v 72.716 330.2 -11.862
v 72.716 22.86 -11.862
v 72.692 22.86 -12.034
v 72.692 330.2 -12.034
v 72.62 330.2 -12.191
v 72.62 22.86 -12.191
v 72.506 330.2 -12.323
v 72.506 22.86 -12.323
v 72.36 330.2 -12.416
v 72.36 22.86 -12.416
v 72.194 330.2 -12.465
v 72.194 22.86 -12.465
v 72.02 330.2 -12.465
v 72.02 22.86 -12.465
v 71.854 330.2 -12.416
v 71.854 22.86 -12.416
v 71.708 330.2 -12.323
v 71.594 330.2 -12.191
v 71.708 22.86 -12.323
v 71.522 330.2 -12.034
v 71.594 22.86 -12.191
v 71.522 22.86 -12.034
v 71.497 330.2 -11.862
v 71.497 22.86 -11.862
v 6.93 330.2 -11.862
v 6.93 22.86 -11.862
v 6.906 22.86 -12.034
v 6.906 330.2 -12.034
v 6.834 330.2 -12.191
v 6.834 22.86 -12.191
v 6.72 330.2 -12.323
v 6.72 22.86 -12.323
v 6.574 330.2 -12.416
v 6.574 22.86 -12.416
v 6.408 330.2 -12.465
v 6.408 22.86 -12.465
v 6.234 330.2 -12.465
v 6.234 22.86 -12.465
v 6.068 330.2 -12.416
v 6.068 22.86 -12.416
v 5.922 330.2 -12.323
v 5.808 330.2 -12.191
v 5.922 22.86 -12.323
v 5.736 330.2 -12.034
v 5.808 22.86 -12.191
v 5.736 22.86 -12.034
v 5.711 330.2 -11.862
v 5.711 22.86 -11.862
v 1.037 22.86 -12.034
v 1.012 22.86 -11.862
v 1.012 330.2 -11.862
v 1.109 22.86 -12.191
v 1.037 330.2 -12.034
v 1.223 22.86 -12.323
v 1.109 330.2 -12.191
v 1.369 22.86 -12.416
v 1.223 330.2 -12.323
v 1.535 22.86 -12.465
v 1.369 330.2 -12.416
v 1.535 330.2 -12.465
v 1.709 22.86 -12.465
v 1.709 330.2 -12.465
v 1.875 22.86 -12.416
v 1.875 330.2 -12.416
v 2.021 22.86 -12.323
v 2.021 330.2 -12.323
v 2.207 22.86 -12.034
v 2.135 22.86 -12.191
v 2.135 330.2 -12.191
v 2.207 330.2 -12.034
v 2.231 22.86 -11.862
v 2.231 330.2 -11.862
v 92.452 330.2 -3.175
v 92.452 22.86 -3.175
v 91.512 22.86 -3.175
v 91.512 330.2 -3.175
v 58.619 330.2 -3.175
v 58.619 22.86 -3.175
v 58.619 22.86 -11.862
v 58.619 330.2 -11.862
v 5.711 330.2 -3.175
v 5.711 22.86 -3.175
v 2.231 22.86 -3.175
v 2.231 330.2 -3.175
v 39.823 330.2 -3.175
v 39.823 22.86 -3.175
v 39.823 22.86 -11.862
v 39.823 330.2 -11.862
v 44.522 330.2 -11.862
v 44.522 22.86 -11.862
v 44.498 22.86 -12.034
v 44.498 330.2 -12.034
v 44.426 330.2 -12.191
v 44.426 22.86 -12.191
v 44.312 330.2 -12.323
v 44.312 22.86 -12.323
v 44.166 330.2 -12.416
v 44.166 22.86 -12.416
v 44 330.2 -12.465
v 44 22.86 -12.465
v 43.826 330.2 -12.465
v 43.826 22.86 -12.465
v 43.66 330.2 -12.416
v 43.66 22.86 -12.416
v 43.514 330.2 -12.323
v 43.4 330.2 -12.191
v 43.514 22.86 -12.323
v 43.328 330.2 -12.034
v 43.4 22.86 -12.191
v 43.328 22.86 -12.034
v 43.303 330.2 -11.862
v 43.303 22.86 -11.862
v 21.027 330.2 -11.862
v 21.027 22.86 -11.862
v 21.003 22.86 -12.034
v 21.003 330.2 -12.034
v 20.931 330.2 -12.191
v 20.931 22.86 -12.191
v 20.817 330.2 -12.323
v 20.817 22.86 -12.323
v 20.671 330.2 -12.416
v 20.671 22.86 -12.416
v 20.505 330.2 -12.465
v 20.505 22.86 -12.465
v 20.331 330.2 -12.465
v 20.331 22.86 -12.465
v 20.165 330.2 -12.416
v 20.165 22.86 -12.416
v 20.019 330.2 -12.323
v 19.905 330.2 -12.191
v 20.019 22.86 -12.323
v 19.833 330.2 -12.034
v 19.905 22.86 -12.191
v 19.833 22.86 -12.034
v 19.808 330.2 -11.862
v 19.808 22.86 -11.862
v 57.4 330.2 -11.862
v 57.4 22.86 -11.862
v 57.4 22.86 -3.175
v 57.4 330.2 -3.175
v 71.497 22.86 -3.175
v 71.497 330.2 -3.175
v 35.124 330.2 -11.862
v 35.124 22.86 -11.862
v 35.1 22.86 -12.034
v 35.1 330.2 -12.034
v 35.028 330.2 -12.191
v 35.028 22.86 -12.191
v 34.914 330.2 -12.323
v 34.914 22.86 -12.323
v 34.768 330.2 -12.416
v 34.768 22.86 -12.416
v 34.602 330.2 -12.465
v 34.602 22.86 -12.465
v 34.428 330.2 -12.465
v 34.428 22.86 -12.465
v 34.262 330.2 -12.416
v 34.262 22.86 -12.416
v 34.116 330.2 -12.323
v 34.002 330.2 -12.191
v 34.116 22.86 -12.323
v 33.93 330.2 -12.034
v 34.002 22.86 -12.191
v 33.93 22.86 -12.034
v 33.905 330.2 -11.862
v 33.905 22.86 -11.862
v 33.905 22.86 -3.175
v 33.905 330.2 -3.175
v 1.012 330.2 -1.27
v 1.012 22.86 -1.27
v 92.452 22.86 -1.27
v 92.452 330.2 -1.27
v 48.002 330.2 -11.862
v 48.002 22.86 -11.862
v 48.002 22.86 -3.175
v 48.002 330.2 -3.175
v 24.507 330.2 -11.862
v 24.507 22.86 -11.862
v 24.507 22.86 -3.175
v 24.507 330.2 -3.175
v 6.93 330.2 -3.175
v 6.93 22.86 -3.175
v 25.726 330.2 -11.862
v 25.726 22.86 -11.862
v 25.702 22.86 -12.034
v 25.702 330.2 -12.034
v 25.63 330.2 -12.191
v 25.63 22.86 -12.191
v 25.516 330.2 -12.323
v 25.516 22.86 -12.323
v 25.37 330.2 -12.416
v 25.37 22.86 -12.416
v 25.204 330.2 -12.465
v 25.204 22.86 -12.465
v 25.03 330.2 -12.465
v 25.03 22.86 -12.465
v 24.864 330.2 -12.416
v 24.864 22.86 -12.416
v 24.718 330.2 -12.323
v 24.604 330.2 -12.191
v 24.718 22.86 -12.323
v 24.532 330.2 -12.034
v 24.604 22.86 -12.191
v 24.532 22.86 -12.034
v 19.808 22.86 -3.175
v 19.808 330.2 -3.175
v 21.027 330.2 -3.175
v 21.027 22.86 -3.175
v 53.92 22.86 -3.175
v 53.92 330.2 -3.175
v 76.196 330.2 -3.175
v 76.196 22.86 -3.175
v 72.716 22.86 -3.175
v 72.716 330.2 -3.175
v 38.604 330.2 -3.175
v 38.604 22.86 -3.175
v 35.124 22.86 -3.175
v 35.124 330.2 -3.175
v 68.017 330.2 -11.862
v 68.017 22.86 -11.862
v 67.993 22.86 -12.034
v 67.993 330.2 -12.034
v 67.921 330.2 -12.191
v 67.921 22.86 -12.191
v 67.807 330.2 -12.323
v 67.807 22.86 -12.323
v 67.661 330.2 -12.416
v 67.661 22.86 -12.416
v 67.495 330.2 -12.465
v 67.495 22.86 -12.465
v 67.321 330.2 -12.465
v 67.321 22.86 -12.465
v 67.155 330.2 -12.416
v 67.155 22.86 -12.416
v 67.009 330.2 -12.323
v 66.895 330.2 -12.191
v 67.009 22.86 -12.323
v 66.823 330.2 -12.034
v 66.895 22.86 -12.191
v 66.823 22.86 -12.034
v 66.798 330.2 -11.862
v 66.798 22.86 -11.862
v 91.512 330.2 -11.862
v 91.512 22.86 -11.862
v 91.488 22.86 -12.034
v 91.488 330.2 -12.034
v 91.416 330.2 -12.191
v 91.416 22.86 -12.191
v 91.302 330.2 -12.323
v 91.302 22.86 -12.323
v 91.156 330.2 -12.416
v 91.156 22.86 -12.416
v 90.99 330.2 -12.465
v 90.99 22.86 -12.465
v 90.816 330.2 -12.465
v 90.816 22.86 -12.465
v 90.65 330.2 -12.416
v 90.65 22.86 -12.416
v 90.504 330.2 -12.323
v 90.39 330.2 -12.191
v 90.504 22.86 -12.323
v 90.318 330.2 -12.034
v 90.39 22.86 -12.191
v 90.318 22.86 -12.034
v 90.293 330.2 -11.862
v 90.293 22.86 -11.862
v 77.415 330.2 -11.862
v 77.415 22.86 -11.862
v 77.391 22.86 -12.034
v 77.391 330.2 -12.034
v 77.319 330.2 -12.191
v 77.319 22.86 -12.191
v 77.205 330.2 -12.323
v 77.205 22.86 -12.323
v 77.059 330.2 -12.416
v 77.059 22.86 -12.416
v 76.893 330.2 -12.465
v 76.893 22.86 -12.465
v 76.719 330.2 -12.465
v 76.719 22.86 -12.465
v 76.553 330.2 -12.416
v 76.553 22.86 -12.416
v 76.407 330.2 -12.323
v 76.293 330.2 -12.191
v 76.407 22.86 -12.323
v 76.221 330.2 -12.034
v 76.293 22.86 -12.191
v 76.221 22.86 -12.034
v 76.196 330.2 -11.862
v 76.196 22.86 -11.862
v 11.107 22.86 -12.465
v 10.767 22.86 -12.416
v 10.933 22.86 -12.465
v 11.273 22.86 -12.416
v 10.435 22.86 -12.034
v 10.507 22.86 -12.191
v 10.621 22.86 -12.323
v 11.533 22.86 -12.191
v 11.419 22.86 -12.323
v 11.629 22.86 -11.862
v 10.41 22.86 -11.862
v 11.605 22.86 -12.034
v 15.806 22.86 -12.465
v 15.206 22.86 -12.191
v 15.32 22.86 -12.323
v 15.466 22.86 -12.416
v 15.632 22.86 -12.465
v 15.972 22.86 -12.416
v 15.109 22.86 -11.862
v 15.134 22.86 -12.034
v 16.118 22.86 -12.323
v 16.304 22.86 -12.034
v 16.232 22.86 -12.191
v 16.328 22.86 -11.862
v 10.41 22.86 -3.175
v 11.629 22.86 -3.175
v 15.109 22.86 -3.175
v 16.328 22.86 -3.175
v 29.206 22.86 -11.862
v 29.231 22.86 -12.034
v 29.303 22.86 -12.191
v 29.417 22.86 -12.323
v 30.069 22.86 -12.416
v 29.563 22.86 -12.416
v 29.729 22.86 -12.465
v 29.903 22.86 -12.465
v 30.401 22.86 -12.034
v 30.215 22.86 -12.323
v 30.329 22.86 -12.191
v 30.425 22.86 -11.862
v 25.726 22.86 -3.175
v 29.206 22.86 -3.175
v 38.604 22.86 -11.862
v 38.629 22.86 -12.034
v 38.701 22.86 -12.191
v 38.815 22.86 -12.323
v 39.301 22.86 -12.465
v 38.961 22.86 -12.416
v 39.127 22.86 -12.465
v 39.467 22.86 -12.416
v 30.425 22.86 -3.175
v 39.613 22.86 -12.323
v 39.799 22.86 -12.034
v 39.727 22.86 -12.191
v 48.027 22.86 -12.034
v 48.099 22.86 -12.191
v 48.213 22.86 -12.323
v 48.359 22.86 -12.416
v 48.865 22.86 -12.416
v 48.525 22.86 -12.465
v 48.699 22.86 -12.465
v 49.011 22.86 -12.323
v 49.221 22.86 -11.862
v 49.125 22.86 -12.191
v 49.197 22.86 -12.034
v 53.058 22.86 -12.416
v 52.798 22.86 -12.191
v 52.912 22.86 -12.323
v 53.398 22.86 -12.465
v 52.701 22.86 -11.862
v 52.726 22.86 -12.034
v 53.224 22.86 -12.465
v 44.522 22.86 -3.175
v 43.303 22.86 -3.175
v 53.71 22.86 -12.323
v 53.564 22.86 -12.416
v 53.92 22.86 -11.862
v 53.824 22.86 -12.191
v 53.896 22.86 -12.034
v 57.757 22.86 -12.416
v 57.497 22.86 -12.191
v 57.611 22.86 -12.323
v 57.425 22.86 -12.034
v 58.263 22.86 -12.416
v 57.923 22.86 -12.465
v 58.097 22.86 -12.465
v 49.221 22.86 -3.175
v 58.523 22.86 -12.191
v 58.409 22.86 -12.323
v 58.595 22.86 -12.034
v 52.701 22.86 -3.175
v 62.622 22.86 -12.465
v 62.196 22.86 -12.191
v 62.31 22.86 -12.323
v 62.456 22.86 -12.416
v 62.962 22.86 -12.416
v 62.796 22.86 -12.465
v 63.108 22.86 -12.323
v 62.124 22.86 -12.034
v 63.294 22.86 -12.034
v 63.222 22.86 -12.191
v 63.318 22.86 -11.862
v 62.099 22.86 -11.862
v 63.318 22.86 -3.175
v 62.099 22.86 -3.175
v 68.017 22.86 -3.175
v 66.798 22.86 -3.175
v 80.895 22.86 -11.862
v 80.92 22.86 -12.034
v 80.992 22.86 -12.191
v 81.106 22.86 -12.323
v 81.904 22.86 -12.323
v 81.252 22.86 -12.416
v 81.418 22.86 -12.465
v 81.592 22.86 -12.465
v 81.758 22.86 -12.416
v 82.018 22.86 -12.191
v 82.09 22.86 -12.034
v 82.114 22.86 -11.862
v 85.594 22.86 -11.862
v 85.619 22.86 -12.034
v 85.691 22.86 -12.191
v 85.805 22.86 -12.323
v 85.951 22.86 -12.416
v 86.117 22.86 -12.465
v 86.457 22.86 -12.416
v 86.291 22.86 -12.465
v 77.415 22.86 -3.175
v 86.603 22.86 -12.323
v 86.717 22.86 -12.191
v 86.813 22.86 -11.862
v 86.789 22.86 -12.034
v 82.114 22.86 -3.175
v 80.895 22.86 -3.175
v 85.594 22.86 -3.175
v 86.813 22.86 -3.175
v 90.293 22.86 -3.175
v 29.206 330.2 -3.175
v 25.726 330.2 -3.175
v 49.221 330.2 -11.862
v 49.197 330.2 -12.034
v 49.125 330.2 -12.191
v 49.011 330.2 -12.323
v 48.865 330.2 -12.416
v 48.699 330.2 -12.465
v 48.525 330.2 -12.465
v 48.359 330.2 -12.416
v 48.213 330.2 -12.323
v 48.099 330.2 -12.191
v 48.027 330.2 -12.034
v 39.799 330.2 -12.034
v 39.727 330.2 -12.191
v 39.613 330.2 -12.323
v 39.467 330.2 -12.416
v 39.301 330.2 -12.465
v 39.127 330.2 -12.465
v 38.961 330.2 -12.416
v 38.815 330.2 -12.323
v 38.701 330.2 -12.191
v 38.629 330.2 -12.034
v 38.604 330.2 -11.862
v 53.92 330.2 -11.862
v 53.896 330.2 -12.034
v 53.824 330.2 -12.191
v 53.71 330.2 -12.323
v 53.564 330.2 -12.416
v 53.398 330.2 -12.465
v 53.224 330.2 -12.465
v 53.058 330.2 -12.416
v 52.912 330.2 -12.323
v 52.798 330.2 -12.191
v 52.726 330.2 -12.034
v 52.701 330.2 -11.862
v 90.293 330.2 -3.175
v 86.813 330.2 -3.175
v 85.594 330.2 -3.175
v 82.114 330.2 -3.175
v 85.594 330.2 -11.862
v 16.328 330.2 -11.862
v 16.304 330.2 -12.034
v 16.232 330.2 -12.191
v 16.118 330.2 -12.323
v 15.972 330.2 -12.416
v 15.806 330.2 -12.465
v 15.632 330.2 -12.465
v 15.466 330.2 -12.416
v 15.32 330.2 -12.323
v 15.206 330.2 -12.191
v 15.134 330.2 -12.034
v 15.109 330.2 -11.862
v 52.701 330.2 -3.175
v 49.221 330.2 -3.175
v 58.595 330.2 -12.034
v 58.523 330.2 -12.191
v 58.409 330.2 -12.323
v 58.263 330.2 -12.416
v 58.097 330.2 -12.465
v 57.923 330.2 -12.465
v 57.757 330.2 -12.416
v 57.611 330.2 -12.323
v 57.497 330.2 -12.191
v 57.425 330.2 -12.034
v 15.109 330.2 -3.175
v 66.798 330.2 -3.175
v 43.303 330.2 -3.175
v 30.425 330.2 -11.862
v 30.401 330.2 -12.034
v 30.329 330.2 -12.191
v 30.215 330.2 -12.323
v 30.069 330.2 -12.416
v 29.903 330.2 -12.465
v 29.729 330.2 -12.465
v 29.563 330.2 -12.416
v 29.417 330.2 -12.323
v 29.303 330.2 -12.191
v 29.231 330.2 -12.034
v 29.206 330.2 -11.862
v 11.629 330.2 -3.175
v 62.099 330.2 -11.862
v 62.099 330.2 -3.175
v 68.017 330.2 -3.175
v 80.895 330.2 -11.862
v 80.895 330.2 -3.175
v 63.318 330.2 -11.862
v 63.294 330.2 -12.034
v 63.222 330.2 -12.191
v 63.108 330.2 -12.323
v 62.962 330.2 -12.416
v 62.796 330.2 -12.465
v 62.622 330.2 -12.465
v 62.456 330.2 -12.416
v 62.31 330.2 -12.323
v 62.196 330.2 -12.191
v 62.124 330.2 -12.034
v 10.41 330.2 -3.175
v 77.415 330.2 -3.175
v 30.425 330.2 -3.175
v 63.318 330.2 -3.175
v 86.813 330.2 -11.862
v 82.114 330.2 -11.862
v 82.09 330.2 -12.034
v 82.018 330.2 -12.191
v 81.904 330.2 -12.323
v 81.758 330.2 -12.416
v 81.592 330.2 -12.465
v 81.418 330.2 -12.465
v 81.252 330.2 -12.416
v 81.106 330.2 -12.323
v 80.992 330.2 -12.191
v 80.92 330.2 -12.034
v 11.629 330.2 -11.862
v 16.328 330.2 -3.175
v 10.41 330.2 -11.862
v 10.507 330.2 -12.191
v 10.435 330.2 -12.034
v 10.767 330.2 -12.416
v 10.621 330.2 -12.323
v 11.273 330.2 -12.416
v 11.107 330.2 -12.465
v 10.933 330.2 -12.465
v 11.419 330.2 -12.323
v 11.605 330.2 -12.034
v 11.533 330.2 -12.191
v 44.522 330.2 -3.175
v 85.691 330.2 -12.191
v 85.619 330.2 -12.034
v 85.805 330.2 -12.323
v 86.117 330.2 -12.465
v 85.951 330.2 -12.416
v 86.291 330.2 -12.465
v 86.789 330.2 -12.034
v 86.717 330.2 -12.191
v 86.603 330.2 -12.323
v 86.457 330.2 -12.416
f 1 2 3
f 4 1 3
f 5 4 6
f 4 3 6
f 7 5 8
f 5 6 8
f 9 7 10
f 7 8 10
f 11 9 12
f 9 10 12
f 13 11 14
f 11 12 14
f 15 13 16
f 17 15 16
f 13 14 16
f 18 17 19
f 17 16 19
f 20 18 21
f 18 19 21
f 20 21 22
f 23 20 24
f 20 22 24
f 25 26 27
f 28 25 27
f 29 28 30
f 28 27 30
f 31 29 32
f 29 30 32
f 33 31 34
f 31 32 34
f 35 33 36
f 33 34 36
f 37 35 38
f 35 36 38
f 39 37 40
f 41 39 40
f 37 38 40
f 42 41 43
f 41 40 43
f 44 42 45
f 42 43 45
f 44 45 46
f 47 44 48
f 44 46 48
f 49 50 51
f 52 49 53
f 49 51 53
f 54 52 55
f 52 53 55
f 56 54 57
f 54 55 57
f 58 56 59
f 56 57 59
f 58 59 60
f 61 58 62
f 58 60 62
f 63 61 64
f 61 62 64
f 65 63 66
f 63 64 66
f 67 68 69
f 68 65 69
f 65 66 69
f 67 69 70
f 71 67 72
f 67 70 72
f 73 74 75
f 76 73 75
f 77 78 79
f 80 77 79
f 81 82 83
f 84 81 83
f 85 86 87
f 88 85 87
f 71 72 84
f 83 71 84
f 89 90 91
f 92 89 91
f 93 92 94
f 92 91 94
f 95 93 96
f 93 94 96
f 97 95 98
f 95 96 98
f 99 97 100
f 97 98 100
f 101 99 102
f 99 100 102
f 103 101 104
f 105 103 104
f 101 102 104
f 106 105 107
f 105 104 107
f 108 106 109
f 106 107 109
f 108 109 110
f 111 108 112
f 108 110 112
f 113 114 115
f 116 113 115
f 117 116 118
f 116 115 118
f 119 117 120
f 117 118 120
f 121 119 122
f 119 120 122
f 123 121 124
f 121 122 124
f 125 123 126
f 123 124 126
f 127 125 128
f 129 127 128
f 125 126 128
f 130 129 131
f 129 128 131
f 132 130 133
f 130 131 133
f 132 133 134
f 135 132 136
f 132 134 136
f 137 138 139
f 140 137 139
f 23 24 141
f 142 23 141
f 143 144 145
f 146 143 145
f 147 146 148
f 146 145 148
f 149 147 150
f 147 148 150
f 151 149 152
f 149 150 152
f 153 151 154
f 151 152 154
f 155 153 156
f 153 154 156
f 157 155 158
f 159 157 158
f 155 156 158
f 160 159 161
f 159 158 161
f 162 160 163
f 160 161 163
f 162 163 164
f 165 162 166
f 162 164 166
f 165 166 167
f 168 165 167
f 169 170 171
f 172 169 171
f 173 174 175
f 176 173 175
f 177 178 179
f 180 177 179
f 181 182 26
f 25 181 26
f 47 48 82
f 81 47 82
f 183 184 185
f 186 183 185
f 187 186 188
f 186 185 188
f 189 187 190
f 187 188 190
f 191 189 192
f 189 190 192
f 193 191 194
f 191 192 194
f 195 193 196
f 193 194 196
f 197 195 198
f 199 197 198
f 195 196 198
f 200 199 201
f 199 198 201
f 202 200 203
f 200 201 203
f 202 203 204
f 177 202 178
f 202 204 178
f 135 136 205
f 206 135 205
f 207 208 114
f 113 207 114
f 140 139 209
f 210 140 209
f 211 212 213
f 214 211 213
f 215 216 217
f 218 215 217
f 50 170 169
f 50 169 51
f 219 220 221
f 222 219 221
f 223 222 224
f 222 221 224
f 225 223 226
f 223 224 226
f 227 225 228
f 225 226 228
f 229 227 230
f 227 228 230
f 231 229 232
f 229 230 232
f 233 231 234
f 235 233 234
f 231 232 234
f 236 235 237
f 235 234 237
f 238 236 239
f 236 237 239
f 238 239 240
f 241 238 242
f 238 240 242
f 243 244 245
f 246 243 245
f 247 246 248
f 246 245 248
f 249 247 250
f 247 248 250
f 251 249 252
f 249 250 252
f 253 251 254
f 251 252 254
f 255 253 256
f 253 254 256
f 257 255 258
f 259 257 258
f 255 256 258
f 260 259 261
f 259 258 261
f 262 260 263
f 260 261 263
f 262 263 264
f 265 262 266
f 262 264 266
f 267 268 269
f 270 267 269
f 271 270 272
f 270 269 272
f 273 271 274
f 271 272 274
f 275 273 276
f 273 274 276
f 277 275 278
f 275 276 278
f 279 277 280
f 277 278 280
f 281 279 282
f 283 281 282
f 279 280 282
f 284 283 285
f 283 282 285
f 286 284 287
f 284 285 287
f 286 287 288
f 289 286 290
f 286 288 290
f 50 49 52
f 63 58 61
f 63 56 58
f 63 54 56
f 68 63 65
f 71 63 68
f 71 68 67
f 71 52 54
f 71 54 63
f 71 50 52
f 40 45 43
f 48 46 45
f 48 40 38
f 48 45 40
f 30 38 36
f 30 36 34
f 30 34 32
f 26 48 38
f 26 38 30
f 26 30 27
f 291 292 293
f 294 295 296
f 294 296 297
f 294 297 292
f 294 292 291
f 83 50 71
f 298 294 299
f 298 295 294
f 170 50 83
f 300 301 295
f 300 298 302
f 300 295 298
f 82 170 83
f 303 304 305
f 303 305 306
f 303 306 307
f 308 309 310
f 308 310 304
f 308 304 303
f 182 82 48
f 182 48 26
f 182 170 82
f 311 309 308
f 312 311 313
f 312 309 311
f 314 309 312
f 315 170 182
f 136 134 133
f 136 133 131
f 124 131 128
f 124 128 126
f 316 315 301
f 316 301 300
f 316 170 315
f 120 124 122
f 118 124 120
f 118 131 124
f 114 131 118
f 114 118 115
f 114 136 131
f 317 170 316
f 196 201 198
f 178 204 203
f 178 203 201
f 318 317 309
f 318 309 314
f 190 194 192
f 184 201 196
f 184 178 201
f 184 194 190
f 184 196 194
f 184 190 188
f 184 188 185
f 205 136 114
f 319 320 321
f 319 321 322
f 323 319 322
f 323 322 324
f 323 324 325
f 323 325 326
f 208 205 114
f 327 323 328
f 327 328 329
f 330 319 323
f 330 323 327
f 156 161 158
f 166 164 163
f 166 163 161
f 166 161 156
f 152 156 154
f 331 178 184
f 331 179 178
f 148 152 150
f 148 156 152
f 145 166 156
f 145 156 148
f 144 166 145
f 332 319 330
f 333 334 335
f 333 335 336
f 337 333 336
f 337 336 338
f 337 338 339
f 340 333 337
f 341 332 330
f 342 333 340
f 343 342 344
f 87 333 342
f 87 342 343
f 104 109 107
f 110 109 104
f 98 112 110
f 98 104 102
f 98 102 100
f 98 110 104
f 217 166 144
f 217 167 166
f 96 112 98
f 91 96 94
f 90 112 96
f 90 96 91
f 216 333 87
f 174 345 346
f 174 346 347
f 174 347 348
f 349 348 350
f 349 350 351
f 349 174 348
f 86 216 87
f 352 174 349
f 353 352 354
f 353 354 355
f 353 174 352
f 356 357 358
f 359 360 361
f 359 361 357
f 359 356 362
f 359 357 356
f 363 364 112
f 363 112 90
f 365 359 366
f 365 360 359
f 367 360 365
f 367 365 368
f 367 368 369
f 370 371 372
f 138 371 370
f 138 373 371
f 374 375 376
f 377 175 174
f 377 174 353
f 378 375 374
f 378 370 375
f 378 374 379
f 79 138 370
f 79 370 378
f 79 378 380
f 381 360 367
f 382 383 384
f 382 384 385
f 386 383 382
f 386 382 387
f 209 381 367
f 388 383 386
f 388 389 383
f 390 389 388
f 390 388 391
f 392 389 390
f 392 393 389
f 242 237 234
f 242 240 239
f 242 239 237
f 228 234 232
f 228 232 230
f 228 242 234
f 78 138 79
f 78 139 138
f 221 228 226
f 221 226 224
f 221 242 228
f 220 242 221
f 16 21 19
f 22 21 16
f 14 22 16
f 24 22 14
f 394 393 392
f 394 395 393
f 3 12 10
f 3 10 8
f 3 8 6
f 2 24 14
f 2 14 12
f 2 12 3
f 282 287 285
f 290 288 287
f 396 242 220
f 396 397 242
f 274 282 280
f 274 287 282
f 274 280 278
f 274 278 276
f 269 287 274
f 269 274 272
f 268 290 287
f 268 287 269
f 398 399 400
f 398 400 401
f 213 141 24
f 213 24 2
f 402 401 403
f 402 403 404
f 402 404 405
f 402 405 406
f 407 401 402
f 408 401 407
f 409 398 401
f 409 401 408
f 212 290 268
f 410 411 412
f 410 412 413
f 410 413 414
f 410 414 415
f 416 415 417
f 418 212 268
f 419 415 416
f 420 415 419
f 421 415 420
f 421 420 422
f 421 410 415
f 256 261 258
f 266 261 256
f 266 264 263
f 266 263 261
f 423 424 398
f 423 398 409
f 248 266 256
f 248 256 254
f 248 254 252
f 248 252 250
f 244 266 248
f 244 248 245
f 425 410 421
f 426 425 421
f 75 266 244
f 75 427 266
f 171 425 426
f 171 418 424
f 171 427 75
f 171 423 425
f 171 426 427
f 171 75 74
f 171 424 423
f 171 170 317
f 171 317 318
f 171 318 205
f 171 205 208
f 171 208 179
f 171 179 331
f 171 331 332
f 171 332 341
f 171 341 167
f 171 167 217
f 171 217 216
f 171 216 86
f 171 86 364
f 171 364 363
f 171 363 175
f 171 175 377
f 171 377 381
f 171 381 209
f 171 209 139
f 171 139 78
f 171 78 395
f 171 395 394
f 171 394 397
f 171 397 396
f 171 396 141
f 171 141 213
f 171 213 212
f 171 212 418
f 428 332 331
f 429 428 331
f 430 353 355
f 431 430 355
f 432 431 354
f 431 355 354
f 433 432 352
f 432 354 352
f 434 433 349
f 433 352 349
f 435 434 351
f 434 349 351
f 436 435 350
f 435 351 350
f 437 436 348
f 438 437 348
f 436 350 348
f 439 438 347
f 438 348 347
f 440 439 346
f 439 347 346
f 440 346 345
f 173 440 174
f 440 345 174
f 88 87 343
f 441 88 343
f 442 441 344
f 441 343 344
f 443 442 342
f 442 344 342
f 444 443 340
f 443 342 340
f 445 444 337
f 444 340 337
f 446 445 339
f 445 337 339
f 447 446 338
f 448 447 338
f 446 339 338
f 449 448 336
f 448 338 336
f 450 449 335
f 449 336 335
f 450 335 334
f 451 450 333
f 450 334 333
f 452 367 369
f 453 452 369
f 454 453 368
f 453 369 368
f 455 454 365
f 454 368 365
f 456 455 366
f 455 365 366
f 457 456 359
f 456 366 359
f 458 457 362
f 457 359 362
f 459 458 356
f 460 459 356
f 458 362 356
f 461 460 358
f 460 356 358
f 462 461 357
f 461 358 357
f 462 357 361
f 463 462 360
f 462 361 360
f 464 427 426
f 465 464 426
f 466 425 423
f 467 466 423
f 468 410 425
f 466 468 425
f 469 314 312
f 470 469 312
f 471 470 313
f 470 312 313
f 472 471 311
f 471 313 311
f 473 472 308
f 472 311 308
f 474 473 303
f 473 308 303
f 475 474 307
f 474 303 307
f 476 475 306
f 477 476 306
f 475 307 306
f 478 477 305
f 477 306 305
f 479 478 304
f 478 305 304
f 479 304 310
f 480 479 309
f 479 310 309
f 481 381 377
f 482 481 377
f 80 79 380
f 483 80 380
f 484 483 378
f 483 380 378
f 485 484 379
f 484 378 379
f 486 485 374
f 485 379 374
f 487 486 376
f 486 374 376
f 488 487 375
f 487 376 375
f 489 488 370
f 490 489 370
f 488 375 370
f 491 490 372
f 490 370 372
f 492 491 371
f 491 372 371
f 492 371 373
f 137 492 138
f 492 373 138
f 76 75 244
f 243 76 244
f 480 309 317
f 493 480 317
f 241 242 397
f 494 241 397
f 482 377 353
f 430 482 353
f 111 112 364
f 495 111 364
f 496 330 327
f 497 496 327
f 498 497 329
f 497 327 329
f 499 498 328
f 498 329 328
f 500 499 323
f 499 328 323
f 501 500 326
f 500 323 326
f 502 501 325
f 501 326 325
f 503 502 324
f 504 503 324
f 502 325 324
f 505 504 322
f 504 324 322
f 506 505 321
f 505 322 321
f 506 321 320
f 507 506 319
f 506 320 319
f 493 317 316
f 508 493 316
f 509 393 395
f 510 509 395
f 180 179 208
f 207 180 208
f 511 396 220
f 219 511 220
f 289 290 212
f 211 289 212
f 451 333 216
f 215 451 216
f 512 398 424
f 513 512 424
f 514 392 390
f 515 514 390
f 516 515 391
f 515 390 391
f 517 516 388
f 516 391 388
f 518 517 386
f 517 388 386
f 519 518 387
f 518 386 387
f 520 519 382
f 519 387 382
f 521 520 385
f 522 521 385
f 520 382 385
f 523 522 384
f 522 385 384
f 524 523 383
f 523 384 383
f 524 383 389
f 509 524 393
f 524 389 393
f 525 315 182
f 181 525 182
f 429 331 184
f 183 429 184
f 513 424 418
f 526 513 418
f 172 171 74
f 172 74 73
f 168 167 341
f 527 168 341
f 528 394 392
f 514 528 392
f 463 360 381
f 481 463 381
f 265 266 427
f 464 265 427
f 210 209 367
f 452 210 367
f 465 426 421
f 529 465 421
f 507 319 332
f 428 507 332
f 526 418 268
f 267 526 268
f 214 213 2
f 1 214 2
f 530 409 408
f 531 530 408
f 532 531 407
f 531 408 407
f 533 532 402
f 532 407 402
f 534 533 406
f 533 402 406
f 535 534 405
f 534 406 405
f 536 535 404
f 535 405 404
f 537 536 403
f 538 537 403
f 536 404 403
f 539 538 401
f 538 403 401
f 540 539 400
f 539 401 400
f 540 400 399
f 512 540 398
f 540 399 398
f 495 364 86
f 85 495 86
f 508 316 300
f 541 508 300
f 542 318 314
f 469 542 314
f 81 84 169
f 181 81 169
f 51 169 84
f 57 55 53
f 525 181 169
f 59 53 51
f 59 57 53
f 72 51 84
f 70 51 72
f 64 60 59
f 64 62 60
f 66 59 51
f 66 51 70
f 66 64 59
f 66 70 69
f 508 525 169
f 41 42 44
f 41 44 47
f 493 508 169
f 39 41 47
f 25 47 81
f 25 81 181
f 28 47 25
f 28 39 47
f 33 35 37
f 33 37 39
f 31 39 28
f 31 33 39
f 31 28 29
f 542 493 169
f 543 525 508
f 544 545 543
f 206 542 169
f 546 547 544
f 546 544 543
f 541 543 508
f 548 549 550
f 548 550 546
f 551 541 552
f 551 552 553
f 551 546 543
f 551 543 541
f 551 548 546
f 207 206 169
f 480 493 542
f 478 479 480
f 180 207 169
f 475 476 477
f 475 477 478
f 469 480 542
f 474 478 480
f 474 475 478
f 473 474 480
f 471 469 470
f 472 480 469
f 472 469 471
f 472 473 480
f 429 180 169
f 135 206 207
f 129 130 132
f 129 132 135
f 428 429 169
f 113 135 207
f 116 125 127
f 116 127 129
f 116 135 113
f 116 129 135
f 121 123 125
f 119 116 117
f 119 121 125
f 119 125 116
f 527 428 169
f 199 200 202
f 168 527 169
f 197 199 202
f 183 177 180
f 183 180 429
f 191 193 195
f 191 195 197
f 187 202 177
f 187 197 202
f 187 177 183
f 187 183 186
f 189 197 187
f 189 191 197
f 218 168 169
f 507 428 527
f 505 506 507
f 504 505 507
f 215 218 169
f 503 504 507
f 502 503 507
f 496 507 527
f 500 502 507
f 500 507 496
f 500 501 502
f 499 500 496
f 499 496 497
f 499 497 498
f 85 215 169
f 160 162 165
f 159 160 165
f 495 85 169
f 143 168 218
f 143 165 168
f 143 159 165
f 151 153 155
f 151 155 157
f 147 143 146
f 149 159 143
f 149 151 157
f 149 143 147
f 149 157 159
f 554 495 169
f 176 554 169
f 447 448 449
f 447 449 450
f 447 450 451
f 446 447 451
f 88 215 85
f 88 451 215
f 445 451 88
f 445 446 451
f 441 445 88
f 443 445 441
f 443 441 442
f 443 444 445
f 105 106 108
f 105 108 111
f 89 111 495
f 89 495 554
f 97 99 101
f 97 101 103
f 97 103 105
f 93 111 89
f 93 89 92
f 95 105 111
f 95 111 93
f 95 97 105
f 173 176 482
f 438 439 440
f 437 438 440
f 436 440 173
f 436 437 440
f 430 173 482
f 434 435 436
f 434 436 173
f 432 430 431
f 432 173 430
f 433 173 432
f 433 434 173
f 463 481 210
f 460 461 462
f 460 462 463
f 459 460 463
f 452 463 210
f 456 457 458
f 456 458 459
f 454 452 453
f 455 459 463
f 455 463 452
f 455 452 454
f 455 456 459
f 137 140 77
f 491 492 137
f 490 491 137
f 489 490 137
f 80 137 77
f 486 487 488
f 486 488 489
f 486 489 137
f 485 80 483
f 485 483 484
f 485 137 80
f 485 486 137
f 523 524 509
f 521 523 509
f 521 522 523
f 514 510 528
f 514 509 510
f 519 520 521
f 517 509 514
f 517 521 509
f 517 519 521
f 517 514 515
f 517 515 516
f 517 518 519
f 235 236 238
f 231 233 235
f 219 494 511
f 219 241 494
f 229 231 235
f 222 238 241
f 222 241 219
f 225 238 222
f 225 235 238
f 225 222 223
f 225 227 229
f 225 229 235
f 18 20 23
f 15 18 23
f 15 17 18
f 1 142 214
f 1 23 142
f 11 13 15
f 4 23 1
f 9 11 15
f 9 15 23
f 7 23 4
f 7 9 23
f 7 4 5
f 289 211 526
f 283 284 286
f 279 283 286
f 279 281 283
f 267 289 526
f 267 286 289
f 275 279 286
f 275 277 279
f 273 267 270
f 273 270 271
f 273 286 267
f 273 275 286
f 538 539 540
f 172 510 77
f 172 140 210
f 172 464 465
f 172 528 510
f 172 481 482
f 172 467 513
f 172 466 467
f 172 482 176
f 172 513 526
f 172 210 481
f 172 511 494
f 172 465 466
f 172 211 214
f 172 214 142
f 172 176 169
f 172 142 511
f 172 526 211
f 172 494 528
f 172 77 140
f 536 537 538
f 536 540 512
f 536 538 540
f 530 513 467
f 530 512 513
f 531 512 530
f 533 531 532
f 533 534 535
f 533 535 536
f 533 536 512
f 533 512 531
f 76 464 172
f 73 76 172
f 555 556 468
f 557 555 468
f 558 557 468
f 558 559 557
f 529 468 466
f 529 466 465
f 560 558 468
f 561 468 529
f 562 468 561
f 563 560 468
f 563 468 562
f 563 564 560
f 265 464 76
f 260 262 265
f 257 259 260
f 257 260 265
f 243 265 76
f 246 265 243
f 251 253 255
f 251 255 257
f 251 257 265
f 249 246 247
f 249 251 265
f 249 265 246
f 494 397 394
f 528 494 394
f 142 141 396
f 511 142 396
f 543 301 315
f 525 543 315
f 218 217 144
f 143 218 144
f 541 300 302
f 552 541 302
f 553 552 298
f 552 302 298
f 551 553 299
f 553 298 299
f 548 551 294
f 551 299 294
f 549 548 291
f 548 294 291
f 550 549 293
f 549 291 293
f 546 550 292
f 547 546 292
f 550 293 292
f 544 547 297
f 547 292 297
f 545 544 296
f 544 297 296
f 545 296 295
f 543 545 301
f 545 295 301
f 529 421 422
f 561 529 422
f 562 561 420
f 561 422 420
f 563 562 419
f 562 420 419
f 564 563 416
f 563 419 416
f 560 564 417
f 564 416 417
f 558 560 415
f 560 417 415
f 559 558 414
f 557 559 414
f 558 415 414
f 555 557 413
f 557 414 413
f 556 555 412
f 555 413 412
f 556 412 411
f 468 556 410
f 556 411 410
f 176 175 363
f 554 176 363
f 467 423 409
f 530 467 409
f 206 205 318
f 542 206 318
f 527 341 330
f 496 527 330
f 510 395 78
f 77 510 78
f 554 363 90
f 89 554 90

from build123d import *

# Parameters (mm, degrees)
BOSS_EXTRUDE1_DEPTH   = 330.2
BOSS_EXTRUDE2_DEPTH   = 330.2
SKETCH_PATTERN1_DEPTH = 330.2
SKETCH5_W             = 0.4826
SKETCH5_H             = 3.175
BOSS_EXTRUDE3_DEPTH   = 254
SKETCH10_OUTSIDE_W    = 282.866
SKETCH10_OUTSIDE_H    = 409.79
SKETCH10_OUTSIDE_W_2  = 91.44
SKETCH10_OUTSIDE_H_2  = 330.2
CUT_EXTRUDE3_DEPTH    = 389.485949469
SKETCH11_OUTSIDE_W    = 162.01
SKETCH11_OUTSIDE_H    = 400.77
SKETCH11_OUTSIDE_W_2  = 91.44
SKETCH11_OUTSIDE_H_2  = 307.34
CUT_EXTRUDE4_DEPTH    = 344.125324268
SKETCH12_W            = 91.44
SKETCH12_H            = 307.34
CUT_EXTRUDE5_DEPTH    = 1.27


# Read off the part's stored shape, not the designer's step: Sketch-Pattern1
with BuildPart() as part:
    # Sketch1 → Boss-Extrude1 (new body)
    with BuildSketch(Plane(origin=(0, 0, 0), x_dir=(1, 0, 0), z_dir=(0, 1, 0))):
        Polygon((1.012216501, 3.175), (1.012216501, 0), (203.805816501, 0), (203.805816501, 3.175), (2.231416501, 3.175), align=None)
    extrude(amount=BOSS_EXTRUDE1_DEPTH)

    # Sketch3 → Boss-Extrude2 (add, through all)
    with BuildSketch(Plane(origin=(0, 330.2, 0), x_dir=(1, 0, 0), z_dir=(0, 1, 0))):
        with BuildLine():
            Line((1.012216501, 3.175), (1.012216501, 11.8618))
            ThreePointArc((1.012216501, 11.8618), (1.621816501, 12.4714), (2.231416501, 11.8618))
            Line((2.231416501, 11.8618), (2.231416501, 3.175))
            Line((2.231416501, 3.175), (1.012216501, 3.175))
        make_face()
    extrude(amount=-BOSS_EXTRUDE2_DEPTH)

    # Sketch-Pattern1 outline → Sketch-Pattern1 (add)
    with BuildSketch(Plane(origin=(0, 0, 0), x_dir=(1, 0, 0), z_dir=(0, 1, 0))):
        with BuildLine():
            Line((6.930416501, 3.175), (6.930416501, 11.8618))
            ThreePointArc((6.930416501, 11.8618), (6.320816501, 12.4714), (5.711216501, 11.8618))
            Line((5.711216501, 11.8618), (5.711216501, 3.175))
            Line((5.711216501, 3.175), (6.930416501, 3.175))
        make_face()
        with BuildLine():
            Line((203.069216501, 11.8618), (203.069216501, 3.175))
            Line((203.069216501, 3.175), (204.288416501, 3.175))
            Line((204.288416501, 3.175), (204.288416501, 11.8618))
            ThreePointArc((204.288416501, 11.8618), (203.678816501, 12.4714), (203.069216501, 11.8618))
        make_face()
        with BuildLine():
            Line((198.370216501, 11.8618), (198.370216501, 3.175))
            Line((198.370216501, 3.175), (199.589416501, 3.175))
            Line((199.589416501, 3.175), (199.589416501, 11.8618))
            ThreePointArc((199.589416501, 11.8618), (198.979816501, 12.4714), (198.370216501, 11.8618))
        make_face()
        with BuildLine():
            Line((193.671216501, 11.8618), (193.671216501, 3.175))
            Line((193.671216501, 3.175), (194.890416501, 3.175))
            Line((194.890416501, 3.175), (194.890416501, 11.8618))
            ThreePointArc((194.890416501, 11.8618), (194.280816501, 12.4714), (193.671216501, 11.8618))
        make_face()
        with BuildLine():
            Line((188.972216501, 11.8618), (188.972216501, 3.175))
            Line((188.972216501, 3.175), (190.191416501, 3.175))
            Line((190.191416501, 3.175), (190.191416501, 11.8618))
            ThreePointArc((190.191416501, 11.8618), (189.581816501, 12.4714), (188.972216501, 11.8618))
        make_face()
        with BuildLine():
            Line((184.273216501, 11.8618), (184.273216501, 3.175))
            Line((184.273216501, 3.175), (185.492416501, 3.175))
            Line((185.492416501, 3.175), (185.492416501, 11.8618))
            ThreePointArc((185.492416501, 11.8618), (184.882816501, 12.4714), (184.273216501, 11.8618))
        make_face()
        with BuildLine():
            Line((179.574216501, 11.8618), (179.574216501, 3.175))
            Line((179.574216501, 3.175), (180.793416501, 3.175))
            Line((180.793416501, 3.175), (180.793416501, 11.8618))
            ThreePointArc((180.793416501, 11.8618), (180.183816501, 12.4714), (179.574216501, 11.8618))
        make_face()
        with BuildLine():
            Line((174.875216501, 11.8618), (174.875216501, 3.175))
            Line((174.875216501, 3.175), (176.094416501, 3.175))
            Line((176.094416501, 3.175), (176.094416501, 11.8618))
            ThreePointArc((176.094416501, 11.8618), (175.484816501, 12.4714), (174.875216501, 11.8618))
        make_face()
        with BuildLine():
            Line((170.176216501, 11.8618), (170.176216501, 3.175))
            Line((170.176216501, 3.175), (171.395416501, 3.175))
            Line((171.395416501, 3.175), (171.395416501, 11.8618))
            ThreePointArc((171.395416501, 11.8618), (170.785816501, 12.4714), (170.176216501, 11.8618))
        make_face()
        with BuildLine():
            Line((165.477216501, 11.8618), (165.477216501, 3.175))
            Line((165.477216501, 3.175), (166.696416501, 3.175))
            Line((166.696416501, 3.175), (166.696416501, 11.8618))
            ThreePointArc((166.696416501, 11.8618), (166.086816501, 12.4714), (165.477216501, 11.8618))
        make_face()
        with BuildLine():
            Line((160.778216501, 11.8618), (160.778216501, 3.175))
            Line((160.778216501, 3.175), (161.997416501, 3.175))
            Line((161.997416501, 3.175), (161.997416501, 11.8618))
            ThreePointArc((161.997416501, 11.8618), (161.387816501, 12.4714), (160.778216501, 11.8618))
        make_face()
        with BuildLine():
            Line((156.079216501, 11.8618), (156.079216501, 3.175))
            Line((156.079216501, 3.175), (157.298416501, 3.175))
            Line((157.298416501, 3.175), (157.298416501, 11.8618))
            ThreePointArc((157.298416501, 11.8618), (156.688816501, 12.4714), (156.079216501, 11.8618))
        make_face()
        with BuildLine():
            Line((151.380216501, 11.8618), (151.380216501, 3.175))
            Line((151.380216501, 3.175), (152.599416501, 3.175))
            Line((152.599416501, 3.175), (152.599416501, 11.8618))
            ThreePointArc((152.599416501, 11.8618), (151.989816501, 12.4714), (151.380216501, 11.8618))
        make_face()
        with BuildLine():
            Line((146.681216501, 11.8618), (146.681216501, 3.175))
            Line((146.681216501, 3.175), (147.900416501, 3.175))
            Line((147.900416501, 3.175), (147.900416501, 11.8618))
            ThreePointArc((147.900416501, 11.8618), (147.290816501, 12.4714), (146.681216501, 11.8618))
        make_face()
        with BuildLine():
            Line((141.982216501, 11.8618), (141.982216501, 3.175))
            Line((141.982216501, 3.175), (143.201416501, 3.175))
            Line((143.201416501, 3.175), (143.201416501, 11.8618))
            ThreePointArc((143.201416501, 11.8618), (142.591816501, 12.4714), (141.982216501, 11.8618))
        make_face()
        with BuildLine():
            Line((137.283216501, 11.8618), (137.283216501, 3.175))
            Line((137.283216501, 3.175), (138.502416501, 3.175))
            Line((138.502416501, 3.175), (138.502416501, 11.8618))
            ThreePointArc((138.502416501, 11.8618), (137.892816501, 12.4714), (137.283216501, 11.8618))
        make_face()
        with BuildLine():
            Line((132.584216501, 11.8618), (132.584216501, 3.175))
            Line((132.584216501, 3.175), (133.803416501, 3.175))
            Line((133.803416501, 3.175), (133.803416501, 11.8618))
            ThreePointArc((133.803416501, 11.8618), (133.193816501, 12.4714), (132.584216501, 11.8618))
        make_face()
        with BuildLine():
            Line((127.885216501, 11.8618), (127.885216501, 3.175))
            Line((127.885216501, 3.175), (129.104416501, 3.175))
            Line((129.104416501, 3.175), (129.104416501, 11.8618))
            ThreePointArc((129.104416501, 11.8618), (128.494816501, 12.4714), (127.885216501, 11.8618))
        make_face()
        with BuildLine():
            Line((123.186216501, 11.8618), (123.186216501, 3.175))
            Line((123.186216501, 3.175), (124.405416501, 3.175))
            Line((124.405416501, 3.175), (124.405416501, 11.8618))
            ThreePointArc((124.405416501, 11.8618), (123.795816501, 12.4714), (123.186216501, 11.8618))
        make_face()
        with BuildLine():
            Line((118.487216501, 11.8618), (118.487216501, 3.175))
            Line((118.487216501, 3.175), (119.706416501, 3.175))
            Line((119.706416501, 3.175), (119.706416501, 11.8618))
            ThreePointArc((119.706416501, 11.8618), (119.096816501, 12.4714), (118.487216501, 11.8618))
        make_face()
        with BuildLine():
            Line((113.788216501, 11.8618), (113.788216501, 3.175))
            Line((113.788216501, 3.175), (115.007416501, 3.175))
            Line((115.007416501, 3.175), (115.007416501, 11.8618))
            ThreePointArc((115.007416501, 11.8618), (114.397816501, 12.4714), (113.788216501, 11.8618))
        make_face()
        with BuildLine():
            Line((109.089216501, 11.8618), (109.089216501, 3.175))
            Line((109.089216501, 3.175), (110.308416501, 3.175))
            Line((110.308416501, 3.175), (110.308416501, 11.8618))
            ThreePointArc((110.308416501, 11.8618), (109.698816501, 12.4714), (109.089216501, 11.8618))
        make_face()
        with BuildLine():
            Line((104.390216501, 11.8618), (104.390216501, 3.175))
            Line((104.390216501, 3.175), (105.609416501, 3.175))
            Line((105.609416501, 3.175), (105.609416501, 11.8618))
            ThreePointArc((105.609416501, 11.8618), (104.999816501, 12.4714), (104.390216501, 11.8618))
        make_face()
        with BuildLine():
            Line((99.691216501, 11.8618), (99.691216501, 3.175))
            Line((99.691216501, 3.175), (100.910416501, 3.175))
            Line((100.910416501, 3.175), (100.910416501, 11.8618))
            ThreePointArc((100.910416501, 11.8618), (100.300816501, 12.4714), (99.691216501, 11.8618))
        make_face()
        with BuildLine():
            Line((94.992216501, 11.8618), (94.992216501, 3.175))
            Line((94.992216501, 3.175), (96.211416501, 3.175))
            Line((96.211416501, 3.175), (96.211416501, 11.8618))
            ThreePointArc((96.211416501, 11.8618), (95.601816501, 12.4714), (94.992216501, 11.8618))
        make_face()
        with BuildLine():
            Line((90.293216501, 11.8618), (90.293216501, 3.175))
            Line((90.293216501, 3.175), (91.512416501, 3.175))
            Line((91.512416501, 3.175), (91.512416501, 11.8618))
            ThreePointArc((91.512416501, 11.8618), (90.902816501, 12.4714), (90.293216501, 11.8618))
        make_face()
        with BuildLine():
            Line((85.594216501, 11.8618), (85.594216501, 3.175))
            Line((85.594216501, 3.175), (86.813416501, 3.175))
            Line((86.813416501, 3.175), (86.813416501, 11.8618))
            ThreePointArc((86.813416501, 11.8618), (86.203816501, 12.4714), (85.594216501, 11.8618))
        make_face()
        with BuildLine():
            Line((80.895216501, 11.8618), (80.895216501, 3.175))
            Line((80.895216501, 3.175), (82.114416501, 3.175))
            Line((82.114416501, 3.175), (82.114416501, 11.8618))
            ThreePointArc((82.114416501, 11.8618), (81.504816501, 12.4714), (80.895216501, 11.8618))
        make_face()
        with BuildLine():
            Line((76.196216501, 11.8618), (76.196216501, 3.175))
            Line((76.196216501, 3.175), (77.415416501, 3.175))
            Line((77.415416501, 3.175), (77.415416501, 11.8618))
            ThreePointArc((77.415416501, 11.8618), (76.805816501, 12.4714), (76.196216501, 11.8618))
        make_face()
        with BuildLine():
            Line((71.497216501, 11.8618), (71.497216501, 3.175))
            Line((71.497216501, 3.175), (72.716416501, 3.175))
            Line((72.716416501, 3.175), (72.716416501, 11.8618))
            ThreePointArc((72.716416501, 11.8618), (72.106816501, 12.4714), (71.497216501, 11.8618))
        make_face()
        with BuildLine():
            Line((66.798216501, 11.8618), (66.798216501, 3.175))
            Line((66.798216501, 3.175), (68.017416501, 3.175))
            Line((68.017416501, 3.175), (68.017416501, 11.8618))
            ThreePointArc((68.017416501, 11.8618), (67.407816501, 12.4714), (66.798216501, 11.8618))
        make_face()
        with BuildLine():
            Line((62.099216501, 11.8618), (62.099216501, 3.175))
            Line((62.099216501, 3.175), (63.318416501, 3.175))
            Line((63.318416501, 3.175), (63.318416501, 11.8618))
            ThreePointArc((63.318416501, 11.8618), (62.708816501, 12.4714), (62.099216501, 11.8618))
        make_face()
        with BuildLine():
            Line((57.400216501, 11.8618), (57.400216501, 3.175))
            Line((57.400216501, 3.175), (58.619416501, 3.175))
            Line((58.619416501, 3.175), (58.619416501, 11.8618))
            ThreePointArc((58.619416501, 11.8618), (58.009816501, 12.4714), (57.400216501, 11.8618))
        make_face()
        with BuildLine():
            Line((52.701216501, 11.8618), (52.701216501, 3.175))
            Line((52.701216501, 3.175), (53.920416501, 3.175))
            Line((53.920416501, 3.175), (53.920416501, 11.8618))
            ThreePointArc((53.920416501, 11.8618), (53.310816501, 12.4714), (52.701216501, 11.8618))
        make_face()
        with BuildLine():
            Line((48.002216501, 11.8618), (48.002216501, 3.175))
            Line((48.002216501, 3.175), (49.221416501, 3.175))
            Line((49.221416501, 3.175), (49.221416501, 11.8618))
            ThreePointArc((49.221416501, 11.8618), (48.611816501, 12.4714), (48.002216501, 11.8618))
        make_face()
        with BuildLine():
            Line((43.303216501, 11.8618), (43.303216501, 3.175))
            Line((43.303216501, 3.175), (44.522416501, 3.175))
            Line((44.522416501, 3.175), (44.522416501, 11.8618))
            ThreePointArc((44.522416501, 11.8618), (43.912816501, 12.4714), (43.303216501, 11.8618))
        make_face()
        with BuildLine():
            Line((38.604216501, 11.8618), (38.604216501, 3.175))
            Line((38.604216501, 3.175), (39.823416501, 3.175))
            Line((39.823416501, 3.175), (39.823416501, 11.8618))
            ThreePointArc((39.823416501, 11.8618), (39.213816501, 12.4714), (38.604216501, 11.8618))
        make_face()
        with BuildLine():
            Line((33.905216501, 11.8618), (33.905216501, 3.175))
            Line((33.905216501, 3.175), (35.124416501, 3.175))
            Line((35.124416501, 3.175), (35.124416501, 11.8618))
            ThreePointArc((35.124416501, 11.8618), (34.514816501, 12.4714), (33.905216501, 11.8618))
        make_face()
        with BuildLine():
            Line((29.206216501, 11.8618), (29.206216501, 3.175))
            Line((29.206216501, 3.175), (30.425416501, 3.175))
            Line((30.425416501, 3.175), (30.425416501, 11.8618))
            ThreePointArc((30.425416501, 11.8618), (29.815816501, 12.4714), (29.206216501, 11.8618))
        make_face()
        with BuildLine():
            Line((24.507216501, 11.8618), (24.507216501, 3.175))
            Line((24.507216501, 3.175), (25.726416501, 3.175))
            Line((25.726416501, 3.175), (25.726416501, 11.8618))
            ThreePointArc((25.726416501, 11.8618), (25.116816501, 12.4714), (24.507216501, 11.8618))
        make_face()
        with BuildLine():
            Line((19.808216501, 11.8618), (19.808216501, 3.175))
            Line((19.808216501, 3.175), (21.027416501, 3.175))
            Line((21.027416501, 3.175), (21.027416501, 11.8618))
            ThreePointArc((21.027416501, 11.8618), (20.417816501, 12.4714), (19.808216501, 11.8618))
        make_face()
        with BuildLine():
            Line((15.109216501, 11.8618), (15.109216501, 3.175))
            Line((15.109216501, 3.175), (16.328416501, 3.175))
            Line((16.328416501, 3.175), (16.328416501, 11.8618))
            ThreePointArc((16.328416501, 11.8618), (15.718816501, 12.4714), (15.109216501, 11.8618))
        make_face()
        with BuildLine():
            Line((10.410216501, 11.8618), (10.410216501, 3.175))
            Line((10.410216501, 3.175), (11.629416501, 3.175))
            Line((11.629416501, 3.175), (11.629416501, 11.8618))
            ThreePointArc((11.629416501, 11.8618), (11.019816501, 12.4714), (10.410216501, 11.8618))
        make_face()
    extrude(amount=SKETCH_PATTERN1_DEPTH)

    # Sketch5 → Boss-Extrude3 (add)
    with BuildSketch(Plane(origin=(0, 330.2, 0), x_dir=(1, 0, 0), z_dir=(0, 1, 0))):
        with Locations((204.047116501, 1.5875)):
            Rectangle(SKETCH5_W, SKETCH5_H)
    extrude(amount=-BOSS_EXTRUDE3_DEPTH)

    # Sketch10 outside → Cut-Extrude3 (cut, through all)
    with BuildSketch(Plane.XY):
        with Locations((102.65, 165.1)):
            Rectangle(SKETCH10_OUTSIDE_W, SKETCH10_OUTSIDE_H)
        with Locations((46.732216501, 165.1)):
            Rectangle(SKETCH10_OUTSIDE_W_2, SKETCH10_OUTSIDE_H_2, mode=Mode.SUBTRACT)
    extrude(amount=-CUT_EXTRUDE3_DEPTH, mode=Mode.SUBTRACT)

    # Sketch11 outside → Cut-Extrude4 (cut, through all)
    with BuildSketch(Plane.XY):
        with Locations((46.732, 165.1)):
            Rectangle(SKETCH11_OUTSIDE_W, SKETCH11_OUTSIDE_H)
        with Locations((46.732216501, 176.53)):
            Rectangle(SKETCH11_OUTSIDE_W_2, SKETCH11_OUTSIDE_H_2, mode=Mode.SUBTRACT)
    extrude(amount=-CUT_EXTRUDE4_DEPTH, mode=Mode.SUBTRACT)

    # Sketch12 → Cut-Extrude5 (cut)
    with BuildSketch(Plane.XY):
        with Locations((46.732216501, 176.53)):
            Rectangle(SKETCH12_W, SKETCH12_H)
    extrude(amount=-CUT_EXTRUDE5_DEPTH, mode=Mode.SUBTRACT)


solid = part.part
